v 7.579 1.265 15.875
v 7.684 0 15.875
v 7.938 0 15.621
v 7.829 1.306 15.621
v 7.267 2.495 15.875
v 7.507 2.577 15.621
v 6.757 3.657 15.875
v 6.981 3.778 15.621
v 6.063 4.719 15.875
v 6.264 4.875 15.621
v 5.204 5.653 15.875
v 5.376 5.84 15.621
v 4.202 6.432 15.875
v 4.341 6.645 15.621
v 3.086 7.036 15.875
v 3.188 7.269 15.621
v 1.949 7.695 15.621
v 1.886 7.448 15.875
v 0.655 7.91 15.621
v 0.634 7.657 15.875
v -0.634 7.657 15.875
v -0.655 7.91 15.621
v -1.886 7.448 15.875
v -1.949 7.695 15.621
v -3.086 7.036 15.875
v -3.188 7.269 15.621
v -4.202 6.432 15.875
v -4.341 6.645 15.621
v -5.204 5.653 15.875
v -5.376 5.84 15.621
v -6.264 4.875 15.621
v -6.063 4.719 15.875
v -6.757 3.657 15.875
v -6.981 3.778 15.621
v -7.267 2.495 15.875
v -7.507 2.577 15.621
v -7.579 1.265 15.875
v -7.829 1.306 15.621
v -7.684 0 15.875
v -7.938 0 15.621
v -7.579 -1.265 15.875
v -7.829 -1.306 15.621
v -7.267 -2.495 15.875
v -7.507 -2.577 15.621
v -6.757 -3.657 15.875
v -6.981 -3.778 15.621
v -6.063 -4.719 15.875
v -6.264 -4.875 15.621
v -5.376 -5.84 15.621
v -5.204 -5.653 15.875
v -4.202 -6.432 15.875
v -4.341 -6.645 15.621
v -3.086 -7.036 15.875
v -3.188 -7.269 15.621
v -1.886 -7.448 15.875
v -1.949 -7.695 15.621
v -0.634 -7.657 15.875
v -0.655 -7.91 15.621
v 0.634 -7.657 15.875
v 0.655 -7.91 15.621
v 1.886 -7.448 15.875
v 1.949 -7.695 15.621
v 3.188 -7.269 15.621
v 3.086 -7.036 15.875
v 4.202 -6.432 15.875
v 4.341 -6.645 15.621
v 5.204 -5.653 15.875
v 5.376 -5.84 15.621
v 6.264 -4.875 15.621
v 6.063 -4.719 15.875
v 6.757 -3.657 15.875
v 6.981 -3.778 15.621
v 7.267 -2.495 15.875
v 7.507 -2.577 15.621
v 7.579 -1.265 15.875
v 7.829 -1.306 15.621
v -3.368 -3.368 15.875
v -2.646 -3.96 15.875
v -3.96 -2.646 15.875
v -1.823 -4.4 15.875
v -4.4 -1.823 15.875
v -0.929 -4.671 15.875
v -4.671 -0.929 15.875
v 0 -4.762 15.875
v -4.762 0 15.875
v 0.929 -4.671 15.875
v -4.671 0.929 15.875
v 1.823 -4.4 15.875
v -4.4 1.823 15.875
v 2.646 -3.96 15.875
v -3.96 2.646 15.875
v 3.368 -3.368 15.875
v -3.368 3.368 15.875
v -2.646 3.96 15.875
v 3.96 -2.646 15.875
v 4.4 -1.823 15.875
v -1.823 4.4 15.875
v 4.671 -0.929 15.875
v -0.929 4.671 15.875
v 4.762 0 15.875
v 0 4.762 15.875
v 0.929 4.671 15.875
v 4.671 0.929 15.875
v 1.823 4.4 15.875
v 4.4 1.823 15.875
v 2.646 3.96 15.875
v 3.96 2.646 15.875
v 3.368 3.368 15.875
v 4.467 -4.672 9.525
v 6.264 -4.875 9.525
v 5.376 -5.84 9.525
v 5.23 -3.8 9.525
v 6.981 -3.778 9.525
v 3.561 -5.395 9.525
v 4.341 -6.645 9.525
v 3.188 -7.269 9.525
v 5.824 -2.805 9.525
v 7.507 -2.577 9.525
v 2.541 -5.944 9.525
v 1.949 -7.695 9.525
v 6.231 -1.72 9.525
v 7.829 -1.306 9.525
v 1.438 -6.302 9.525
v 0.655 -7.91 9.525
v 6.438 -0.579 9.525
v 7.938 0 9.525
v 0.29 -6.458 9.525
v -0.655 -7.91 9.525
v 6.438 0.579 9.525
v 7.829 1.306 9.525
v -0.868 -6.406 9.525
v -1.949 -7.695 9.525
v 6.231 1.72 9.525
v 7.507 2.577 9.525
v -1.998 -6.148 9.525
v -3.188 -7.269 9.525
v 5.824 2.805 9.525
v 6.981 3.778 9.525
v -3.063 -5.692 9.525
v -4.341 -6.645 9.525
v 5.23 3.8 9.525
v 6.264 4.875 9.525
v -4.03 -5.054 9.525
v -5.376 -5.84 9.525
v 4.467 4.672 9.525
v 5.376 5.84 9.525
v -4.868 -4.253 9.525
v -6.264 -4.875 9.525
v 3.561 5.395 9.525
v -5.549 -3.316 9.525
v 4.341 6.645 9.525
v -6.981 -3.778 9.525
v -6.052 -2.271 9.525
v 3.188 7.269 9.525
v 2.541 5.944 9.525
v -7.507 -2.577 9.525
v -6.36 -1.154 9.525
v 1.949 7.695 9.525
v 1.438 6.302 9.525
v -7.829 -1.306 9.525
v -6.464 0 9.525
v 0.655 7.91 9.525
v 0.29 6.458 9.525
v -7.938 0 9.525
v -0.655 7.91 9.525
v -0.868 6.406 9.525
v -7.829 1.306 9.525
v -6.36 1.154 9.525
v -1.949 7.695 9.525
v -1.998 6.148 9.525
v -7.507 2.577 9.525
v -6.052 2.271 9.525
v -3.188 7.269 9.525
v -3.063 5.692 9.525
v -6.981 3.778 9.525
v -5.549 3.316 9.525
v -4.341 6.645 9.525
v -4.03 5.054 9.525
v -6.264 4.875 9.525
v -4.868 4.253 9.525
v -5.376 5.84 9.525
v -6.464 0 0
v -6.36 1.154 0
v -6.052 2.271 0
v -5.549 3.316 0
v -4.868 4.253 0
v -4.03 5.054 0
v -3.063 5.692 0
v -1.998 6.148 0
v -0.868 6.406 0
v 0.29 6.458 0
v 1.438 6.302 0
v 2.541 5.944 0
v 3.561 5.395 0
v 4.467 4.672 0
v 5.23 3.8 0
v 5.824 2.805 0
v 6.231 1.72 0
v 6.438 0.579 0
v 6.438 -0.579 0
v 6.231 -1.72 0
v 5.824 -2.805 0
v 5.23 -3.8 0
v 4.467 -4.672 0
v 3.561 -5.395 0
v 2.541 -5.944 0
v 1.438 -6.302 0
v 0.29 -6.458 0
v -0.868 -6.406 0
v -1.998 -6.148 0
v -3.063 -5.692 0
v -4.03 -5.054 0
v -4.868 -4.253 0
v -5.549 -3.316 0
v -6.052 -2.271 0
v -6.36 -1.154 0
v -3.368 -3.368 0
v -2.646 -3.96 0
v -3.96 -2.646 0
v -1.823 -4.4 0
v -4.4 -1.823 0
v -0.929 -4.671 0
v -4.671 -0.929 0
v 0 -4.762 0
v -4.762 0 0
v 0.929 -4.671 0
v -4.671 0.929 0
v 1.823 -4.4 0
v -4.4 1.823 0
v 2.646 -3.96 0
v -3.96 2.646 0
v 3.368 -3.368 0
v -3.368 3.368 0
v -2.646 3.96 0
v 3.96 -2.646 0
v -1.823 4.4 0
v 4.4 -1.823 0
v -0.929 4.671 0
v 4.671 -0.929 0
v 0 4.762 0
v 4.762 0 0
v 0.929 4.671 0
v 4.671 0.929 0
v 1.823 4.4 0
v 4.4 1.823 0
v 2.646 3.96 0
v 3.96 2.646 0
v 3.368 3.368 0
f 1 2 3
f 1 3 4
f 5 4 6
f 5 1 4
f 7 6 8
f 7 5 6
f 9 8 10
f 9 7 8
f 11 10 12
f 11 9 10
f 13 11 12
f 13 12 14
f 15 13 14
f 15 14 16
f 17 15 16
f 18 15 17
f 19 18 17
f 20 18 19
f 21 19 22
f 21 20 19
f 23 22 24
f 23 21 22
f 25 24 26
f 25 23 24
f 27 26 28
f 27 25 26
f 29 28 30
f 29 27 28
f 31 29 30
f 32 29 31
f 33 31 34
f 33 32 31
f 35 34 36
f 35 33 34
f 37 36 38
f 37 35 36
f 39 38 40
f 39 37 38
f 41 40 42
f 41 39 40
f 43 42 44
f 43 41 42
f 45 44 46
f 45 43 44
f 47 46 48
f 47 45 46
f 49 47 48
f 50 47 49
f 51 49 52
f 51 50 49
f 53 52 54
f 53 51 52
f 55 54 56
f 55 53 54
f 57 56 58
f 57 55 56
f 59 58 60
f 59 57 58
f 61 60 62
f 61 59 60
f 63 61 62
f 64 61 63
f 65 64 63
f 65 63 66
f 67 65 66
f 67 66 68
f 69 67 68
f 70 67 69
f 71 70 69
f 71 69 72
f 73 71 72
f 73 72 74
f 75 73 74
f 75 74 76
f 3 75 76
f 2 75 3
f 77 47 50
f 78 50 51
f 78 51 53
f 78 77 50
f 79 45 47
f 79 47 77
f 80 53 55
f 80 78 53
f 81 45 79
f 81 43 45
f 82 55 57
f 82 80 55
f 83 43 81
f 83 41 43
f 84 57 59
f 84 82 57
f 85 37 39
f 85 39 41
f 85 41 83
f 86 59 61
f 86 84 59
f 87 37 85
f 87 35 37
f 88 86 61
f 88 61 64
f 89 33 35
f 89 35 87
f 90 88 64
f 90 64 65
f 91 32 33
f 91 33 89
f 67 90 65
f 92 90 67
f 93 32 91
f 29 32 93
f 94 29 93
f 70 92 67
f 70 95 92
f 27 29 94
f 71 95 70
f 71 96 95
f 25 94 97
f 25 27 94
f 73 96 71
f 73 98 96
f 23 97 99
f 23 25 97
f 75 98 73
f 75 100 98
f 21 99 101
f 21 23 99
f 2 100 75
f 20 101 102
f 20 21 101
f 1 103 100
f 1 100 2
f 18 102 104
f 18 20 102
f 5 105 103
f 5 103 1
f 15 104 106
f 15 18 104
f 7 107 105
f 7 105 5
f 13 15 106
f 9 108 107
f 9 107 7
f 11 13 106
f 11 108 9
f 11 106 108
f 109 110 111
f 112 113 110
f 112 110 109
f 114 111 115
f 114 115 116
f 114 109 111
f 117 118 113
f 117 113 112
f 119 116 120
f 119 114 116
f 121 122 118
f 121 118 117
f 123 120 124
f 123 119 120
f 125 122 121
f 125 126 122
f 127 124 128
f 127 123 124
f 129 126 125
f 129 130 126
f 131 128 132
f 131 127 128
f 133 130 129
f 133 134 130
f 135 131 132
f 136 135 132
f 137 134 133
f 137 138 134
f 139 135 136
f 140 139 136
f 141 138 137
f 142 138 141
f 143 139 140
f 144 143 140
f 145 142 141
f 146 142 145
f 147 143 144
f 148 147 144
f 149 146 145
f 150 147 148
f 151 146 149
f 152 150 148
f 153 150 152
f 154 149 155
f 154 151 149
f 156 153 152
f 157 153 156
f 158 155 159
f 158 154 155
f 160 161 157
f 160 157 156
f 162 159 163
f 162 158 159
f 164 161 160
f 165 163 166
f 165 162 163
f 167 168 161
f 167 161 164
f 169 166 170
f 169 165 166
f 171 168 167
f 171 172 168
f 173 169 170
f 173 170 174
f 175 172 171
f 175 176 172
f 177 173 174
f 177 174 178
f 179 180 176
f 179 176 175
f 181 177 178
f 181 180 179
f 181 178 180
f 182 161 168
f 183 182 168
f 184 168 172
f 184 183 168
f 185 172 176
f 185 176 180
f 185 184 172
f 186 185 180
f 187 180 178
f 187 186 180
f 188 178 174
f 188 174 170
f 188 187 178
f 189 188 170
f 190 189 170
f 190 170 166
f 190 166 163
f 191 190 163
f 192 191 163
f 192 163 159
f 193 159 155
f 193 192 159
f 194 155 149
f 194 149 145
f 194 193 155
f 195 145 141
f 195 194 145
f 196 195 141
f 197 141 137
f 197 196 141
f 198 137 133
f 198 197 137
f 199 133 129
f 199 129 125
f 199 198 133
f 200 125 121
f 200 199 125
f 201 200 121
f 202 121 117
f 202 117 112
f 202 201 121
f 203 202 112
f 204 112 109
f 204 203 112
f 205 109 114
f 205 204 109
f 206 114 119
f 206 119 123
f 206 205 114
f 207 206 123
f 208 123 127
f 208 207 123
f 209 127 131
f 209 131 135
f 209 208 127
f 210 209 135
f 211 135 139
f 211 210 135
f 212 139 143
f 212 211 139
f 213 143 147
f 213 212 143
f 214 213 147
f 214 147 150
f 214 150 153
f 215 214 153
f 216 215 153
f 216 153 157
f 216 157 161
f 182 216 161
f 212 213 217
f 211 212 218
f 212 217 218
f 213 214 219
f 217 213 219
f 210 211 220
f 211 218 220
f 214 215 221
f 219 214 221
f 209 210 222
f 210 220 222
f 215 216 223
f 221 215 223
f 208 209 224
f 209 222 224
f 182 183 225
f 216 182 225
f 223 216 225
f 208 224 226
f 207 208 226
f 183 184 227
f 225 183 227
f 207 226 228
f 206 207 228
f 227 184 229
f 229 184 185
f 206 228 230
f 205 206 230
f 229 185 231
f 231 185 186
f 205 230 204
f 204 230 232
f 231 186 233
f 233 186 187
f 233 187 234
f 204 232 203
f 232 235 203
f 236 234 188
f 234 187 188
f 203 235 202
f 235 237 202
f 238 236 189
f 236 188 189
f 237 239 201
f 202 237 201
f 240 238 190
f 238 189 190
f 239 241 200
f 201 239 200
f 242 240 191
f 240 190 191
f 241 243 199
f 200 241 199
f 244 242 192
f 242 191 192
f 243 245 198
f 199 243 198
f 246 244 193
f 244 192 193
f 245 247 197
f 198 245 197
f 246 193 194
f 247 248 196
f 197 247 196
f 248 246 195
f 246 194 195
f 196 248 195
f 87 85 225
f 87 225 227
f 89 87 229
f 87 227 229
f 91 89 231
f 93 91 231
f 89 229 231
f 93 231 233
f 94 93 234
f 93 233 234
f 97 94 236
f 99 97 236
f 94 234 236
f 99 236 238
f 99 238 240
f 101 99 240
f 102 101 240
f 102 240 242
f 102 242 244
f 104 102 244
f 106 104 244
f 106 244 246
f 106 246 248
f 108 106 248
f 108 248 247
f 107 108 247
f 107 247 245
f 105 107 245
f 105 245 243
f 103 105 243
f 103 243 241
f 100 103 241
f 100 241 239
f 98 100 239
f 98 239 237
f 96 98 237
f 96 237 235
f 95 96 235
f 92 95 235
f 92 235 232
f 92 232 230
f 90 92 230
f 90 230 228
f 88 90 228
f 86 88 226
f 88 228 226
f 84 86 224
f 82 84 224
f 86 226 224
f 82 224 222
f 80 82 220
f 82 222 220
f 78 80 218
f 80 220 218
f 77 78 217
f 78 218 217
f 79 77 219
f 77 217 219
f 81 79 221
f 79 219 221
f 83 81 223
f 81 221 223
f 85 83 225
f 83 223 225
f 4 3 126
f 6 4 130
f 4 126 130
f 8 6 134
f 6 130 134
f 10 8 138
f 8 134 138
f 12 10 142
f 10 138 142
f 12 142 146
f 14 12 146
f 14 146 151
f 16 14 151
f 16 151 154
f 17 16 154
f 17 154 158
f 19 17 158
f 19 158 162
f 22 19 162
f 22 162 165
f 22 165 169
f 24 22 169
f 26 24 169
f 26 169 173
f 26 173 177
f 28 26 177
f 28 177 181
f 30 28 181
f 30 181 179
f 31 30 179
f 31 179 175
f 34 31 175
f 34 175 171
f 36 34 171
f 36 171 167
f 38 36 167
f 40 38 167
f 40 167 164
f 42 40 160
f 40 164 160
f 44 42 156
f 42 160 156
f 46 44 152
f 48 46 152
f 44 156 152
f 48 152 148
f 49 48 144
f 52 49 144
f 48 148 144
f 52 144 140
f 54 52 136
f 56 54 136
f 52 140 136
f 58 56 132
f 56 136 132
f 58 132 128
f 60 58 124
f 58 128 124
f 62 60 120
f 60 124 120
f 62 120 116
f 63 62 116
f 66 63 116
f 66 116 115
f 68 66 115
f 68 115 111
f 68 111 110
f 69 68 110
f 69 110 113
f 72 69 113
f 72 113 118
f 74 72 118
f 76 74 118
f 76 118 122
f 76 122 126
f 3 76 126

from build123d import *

# Parameters (mm, degrees)
SKETCH1_R                   = 7.9375
BOSS_EXTRUDE1_DEPTH         = 15.875
CHAMFER1_SIZE               = 0.254
SKETCH2_OUTSIDE_W           = 23.376
SKETCH2_OUTSIDE_H           = 23.376
SKETCH2_OUTSIDE_R           = 6.4643
CUT_EXTRUDE1_DEPTH          = 9.525
F_5_16_0_3125_DOWEL_HOLE1_D = 9.525


with BuildPart() as part:
    # Sketch1 → Boss-Extrude1 (new body)
    with BuildSketch(Plane.XY):
        Circle(SKETCH1_R)
    extrude(amount=BOSS_EXTRUDE1_DEPTH)

    # Chamfer1
    chamfer1_edges = [part.edges().sort_by_distance(p)[0] for p in [
        (-7.9375, 0, 15.875),
    ]]
    chamfer(chamfer1_edges, length=CHAMFER1_SIZE)

    # Sketch2 outside → Cut-Extrude1 (cut)
    with BuildSketch(Plane(origin=(0, 0, 0), x_dir=(-1, 0, 0), z_dir=(0, 0, -1))):
        Rectangle(SKETCH2_OUTSIDE_W, SKETCH2_OUTSIDE_H)
        Circle(SKETCH2_OUTSIDE_R, mode=Mode.SUBTRACT)
    extrude(amount=-CUT_EXTRUDE1_DEPTH, mode=Mode.SUBTRACT)

    # 5/16 (0.3125) Dowel Hole1 (through all)
    with Locations(Plane.XY.offset(15.875)):
        with Locations((0, 0)):
            Hole(F_5_16_0_3125_DOWEL_HOLE1_D / 2)


solid = part.part
